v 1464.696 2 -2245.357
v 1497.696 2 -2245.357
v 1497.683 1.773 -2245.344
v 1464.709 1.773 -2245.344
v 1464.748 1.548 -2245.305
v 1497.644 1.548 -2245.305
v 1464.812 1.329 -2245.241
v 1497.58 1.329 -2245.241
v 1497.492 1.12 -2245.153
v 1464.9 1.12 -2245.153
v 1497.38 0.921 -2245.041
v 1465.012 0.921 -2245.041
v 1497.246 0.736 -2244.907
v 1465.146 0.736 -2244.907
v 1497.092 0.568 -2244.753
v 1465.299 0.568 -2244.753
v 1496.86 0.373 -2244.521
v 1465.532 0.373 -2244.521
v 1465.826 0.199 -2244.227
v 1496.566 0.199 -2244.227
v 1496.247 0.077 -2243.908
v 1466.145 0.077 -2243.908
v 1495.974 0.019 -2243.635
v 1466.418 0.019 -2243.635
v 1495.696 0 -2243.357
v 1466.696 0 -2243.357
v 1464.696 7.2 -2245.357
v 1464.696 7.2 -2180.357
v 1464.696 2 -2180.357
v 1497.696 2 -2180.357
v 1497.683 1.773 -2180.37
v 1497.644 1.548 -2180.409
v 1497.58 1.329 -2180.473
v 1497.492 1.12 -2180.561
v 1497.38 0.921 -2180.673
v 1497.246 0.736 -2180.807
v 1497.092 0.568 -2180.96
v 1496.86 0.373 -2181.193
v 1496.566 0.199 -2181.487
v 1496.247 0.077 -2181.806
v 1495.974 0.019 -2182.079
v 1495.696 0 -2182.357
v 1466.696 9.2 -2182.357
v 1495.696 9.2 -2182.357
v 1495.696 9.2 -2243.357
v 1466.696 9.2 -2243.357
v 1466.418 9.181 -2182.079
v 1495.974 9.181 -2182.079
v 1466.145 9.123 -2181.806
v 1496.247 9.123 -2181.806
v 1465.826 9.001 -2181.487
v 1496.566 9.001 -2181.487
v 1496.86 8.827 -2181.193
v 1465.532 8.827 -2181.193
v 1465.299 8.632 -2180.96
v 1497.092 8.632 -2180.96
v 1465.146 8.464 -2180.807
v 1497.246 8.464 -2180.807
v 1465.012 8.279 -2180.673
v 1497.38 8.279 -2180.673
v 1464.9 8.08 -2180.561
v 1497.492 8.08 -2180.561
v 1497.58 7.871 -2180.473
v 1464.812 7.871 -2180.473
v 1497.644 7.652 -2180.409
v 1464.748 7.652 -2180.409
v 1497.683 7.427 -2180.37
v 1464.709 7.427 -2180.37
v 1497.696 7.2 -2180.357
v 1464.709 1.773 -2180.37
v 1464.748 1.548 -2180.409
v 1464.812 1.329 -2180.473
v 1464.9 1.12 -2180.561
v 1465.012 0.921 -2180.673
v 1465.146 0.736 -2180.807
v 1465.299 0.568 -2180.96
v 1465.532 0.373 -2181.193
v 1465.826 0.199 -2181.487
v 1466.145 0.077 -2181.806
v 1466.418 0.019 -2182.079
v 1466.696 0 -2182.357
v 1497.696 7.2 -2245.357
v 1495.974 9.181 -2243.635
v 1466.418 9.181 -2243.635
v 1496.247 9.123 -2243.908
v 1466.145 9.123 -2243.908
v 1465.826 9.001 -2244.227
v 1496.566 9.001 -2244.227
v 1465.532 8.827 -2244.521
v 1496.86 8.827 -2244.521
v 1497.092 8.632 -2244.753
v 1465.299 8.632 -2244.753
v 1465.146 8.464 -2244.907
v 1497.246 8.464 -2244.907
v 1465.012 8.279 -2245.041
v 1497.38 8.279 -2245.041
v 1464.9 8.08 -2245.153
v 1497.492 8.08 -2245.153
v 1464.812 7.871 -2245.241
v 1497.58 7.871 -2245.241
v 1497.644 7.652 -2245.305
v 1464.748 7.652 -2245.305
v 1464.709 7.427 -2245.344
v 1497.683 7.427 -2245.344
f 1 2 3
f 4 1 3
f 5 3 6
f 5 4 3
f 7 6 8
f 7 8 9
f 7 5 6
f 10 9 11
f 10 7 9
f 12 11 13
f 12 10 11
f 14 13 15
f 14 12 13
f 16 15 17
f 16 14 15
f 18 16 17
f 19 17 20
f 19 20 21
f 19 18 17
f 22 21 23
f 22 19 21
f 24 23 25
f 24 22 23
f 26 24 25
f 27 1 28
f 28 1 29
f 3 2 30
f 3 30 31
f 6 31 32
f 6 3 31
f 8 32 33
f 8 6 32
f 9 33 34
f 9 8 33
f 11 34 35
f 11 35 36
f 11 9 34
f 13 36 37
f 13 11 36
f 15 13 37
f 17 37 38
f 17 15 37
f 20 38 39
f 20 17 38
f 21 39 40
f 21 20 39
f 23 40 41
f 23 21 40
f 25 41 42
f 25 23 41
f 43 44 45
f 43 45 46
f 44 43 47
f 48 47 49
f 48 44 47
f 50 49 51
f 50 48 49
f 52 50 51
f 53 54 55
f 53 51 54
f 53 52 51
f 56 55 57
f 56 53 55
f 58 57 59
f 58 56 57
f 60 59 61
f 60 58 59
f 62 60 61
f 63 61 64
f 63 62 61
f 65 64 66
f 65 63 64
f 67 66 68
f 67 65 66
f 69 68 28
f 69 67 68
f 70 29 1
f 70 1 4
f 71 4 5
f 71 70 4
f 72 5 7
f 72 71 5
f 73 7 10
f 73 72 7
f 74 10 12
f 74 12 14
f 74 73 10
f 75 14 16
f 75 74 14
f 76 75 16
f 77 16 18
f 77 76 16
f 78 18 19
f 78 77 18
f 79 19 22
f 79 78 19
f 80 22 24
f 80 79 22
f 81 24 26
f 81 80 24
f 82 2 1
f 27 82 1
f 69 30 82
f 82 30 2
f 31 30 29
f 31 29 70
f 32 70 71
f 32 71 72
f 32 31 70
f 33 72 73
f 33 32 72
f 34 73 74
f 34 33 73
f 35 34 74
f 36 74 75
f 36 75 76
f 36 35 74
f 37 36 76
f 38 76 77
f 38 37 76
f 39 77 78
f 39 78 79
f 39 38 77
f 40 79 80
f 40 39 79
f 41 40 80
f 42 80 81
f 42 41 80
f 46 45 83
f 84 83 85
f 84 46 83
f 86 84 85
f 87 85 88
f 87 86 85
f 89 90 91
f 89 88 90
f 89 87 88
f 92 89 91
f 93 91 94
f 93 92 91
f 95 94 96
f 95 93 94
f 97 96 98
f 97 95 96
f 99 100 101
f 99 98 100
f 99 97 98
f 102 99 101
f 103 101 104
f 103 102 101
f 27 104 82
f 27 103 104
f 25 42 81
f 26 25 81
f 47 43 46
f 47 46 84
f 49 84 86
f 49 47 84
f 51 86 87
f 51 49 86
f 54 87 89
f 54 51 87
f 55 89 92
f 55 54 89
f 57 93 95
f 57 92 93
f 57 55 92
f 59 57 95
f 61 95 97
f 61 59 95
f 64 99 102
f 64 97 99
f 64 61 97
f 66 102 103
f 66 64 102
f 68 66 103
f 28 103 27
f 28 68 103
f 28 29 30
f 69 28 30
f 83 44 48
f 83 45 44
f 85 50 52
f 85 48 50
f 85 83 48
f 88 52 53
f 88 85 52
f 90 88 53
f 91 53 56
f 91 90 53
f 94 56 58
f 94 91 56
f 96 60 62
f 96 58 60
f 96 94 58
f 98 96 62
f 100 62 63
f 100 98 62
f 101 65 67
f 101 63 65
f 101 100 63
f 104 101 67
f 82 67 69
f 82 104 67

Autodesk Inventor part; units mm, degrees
ref_plane "YZ Plane" through (0, 0, 0) normal (1, 0, 0) x (0, 1, 0)
ref_plane "XZ Plane" through (0, 0, 0) normal (0, 1, 0) x (-1, 0, 0)
ref_plane "XY Plane" through (0, 0, 0) normal (0, 0, 1) x (1, 0, 0)
sketch "Sketch1" plane through (0, 0, 0) normal (0, 1, 0) x (-1, 0, 0)
  line L0 (-1464.6959, -2180.3569) -> (-1497.6959, -2180.3569)
  line L1 (-1497.6959, -2180.3569) -> (-1497.6959, -2245.3569)
  line L2 (-1497.6959, -2245.3569) -> (-1464.6959, -2245.3569)
  line L3 (-1464.6959, -2245.3569) -> (-1464.6959, -2180.3569)
  point P0 (0, 0)
  dimension "d0" = 33
  dimension "d1" = 65
extrude "Extrusion1" add sketch "Sketch1" along normal blind 9.2
fillet "Fillet1" radius 2 8 edges at (1481.1959, 9.2, -2180.3569) (1497.6959, 9.2, -2212.8569) (1497.6959, 0, -2212.8569) (1481.1959, 9.2, -2245.3569) (1464.6959, 9.2, -2212.8569) (1464.6959, 0, -2212.8569) (1481.1959, 0, -2245.3569) (1481.1959, 0, -2180.3569)
properties part number "Battery"
